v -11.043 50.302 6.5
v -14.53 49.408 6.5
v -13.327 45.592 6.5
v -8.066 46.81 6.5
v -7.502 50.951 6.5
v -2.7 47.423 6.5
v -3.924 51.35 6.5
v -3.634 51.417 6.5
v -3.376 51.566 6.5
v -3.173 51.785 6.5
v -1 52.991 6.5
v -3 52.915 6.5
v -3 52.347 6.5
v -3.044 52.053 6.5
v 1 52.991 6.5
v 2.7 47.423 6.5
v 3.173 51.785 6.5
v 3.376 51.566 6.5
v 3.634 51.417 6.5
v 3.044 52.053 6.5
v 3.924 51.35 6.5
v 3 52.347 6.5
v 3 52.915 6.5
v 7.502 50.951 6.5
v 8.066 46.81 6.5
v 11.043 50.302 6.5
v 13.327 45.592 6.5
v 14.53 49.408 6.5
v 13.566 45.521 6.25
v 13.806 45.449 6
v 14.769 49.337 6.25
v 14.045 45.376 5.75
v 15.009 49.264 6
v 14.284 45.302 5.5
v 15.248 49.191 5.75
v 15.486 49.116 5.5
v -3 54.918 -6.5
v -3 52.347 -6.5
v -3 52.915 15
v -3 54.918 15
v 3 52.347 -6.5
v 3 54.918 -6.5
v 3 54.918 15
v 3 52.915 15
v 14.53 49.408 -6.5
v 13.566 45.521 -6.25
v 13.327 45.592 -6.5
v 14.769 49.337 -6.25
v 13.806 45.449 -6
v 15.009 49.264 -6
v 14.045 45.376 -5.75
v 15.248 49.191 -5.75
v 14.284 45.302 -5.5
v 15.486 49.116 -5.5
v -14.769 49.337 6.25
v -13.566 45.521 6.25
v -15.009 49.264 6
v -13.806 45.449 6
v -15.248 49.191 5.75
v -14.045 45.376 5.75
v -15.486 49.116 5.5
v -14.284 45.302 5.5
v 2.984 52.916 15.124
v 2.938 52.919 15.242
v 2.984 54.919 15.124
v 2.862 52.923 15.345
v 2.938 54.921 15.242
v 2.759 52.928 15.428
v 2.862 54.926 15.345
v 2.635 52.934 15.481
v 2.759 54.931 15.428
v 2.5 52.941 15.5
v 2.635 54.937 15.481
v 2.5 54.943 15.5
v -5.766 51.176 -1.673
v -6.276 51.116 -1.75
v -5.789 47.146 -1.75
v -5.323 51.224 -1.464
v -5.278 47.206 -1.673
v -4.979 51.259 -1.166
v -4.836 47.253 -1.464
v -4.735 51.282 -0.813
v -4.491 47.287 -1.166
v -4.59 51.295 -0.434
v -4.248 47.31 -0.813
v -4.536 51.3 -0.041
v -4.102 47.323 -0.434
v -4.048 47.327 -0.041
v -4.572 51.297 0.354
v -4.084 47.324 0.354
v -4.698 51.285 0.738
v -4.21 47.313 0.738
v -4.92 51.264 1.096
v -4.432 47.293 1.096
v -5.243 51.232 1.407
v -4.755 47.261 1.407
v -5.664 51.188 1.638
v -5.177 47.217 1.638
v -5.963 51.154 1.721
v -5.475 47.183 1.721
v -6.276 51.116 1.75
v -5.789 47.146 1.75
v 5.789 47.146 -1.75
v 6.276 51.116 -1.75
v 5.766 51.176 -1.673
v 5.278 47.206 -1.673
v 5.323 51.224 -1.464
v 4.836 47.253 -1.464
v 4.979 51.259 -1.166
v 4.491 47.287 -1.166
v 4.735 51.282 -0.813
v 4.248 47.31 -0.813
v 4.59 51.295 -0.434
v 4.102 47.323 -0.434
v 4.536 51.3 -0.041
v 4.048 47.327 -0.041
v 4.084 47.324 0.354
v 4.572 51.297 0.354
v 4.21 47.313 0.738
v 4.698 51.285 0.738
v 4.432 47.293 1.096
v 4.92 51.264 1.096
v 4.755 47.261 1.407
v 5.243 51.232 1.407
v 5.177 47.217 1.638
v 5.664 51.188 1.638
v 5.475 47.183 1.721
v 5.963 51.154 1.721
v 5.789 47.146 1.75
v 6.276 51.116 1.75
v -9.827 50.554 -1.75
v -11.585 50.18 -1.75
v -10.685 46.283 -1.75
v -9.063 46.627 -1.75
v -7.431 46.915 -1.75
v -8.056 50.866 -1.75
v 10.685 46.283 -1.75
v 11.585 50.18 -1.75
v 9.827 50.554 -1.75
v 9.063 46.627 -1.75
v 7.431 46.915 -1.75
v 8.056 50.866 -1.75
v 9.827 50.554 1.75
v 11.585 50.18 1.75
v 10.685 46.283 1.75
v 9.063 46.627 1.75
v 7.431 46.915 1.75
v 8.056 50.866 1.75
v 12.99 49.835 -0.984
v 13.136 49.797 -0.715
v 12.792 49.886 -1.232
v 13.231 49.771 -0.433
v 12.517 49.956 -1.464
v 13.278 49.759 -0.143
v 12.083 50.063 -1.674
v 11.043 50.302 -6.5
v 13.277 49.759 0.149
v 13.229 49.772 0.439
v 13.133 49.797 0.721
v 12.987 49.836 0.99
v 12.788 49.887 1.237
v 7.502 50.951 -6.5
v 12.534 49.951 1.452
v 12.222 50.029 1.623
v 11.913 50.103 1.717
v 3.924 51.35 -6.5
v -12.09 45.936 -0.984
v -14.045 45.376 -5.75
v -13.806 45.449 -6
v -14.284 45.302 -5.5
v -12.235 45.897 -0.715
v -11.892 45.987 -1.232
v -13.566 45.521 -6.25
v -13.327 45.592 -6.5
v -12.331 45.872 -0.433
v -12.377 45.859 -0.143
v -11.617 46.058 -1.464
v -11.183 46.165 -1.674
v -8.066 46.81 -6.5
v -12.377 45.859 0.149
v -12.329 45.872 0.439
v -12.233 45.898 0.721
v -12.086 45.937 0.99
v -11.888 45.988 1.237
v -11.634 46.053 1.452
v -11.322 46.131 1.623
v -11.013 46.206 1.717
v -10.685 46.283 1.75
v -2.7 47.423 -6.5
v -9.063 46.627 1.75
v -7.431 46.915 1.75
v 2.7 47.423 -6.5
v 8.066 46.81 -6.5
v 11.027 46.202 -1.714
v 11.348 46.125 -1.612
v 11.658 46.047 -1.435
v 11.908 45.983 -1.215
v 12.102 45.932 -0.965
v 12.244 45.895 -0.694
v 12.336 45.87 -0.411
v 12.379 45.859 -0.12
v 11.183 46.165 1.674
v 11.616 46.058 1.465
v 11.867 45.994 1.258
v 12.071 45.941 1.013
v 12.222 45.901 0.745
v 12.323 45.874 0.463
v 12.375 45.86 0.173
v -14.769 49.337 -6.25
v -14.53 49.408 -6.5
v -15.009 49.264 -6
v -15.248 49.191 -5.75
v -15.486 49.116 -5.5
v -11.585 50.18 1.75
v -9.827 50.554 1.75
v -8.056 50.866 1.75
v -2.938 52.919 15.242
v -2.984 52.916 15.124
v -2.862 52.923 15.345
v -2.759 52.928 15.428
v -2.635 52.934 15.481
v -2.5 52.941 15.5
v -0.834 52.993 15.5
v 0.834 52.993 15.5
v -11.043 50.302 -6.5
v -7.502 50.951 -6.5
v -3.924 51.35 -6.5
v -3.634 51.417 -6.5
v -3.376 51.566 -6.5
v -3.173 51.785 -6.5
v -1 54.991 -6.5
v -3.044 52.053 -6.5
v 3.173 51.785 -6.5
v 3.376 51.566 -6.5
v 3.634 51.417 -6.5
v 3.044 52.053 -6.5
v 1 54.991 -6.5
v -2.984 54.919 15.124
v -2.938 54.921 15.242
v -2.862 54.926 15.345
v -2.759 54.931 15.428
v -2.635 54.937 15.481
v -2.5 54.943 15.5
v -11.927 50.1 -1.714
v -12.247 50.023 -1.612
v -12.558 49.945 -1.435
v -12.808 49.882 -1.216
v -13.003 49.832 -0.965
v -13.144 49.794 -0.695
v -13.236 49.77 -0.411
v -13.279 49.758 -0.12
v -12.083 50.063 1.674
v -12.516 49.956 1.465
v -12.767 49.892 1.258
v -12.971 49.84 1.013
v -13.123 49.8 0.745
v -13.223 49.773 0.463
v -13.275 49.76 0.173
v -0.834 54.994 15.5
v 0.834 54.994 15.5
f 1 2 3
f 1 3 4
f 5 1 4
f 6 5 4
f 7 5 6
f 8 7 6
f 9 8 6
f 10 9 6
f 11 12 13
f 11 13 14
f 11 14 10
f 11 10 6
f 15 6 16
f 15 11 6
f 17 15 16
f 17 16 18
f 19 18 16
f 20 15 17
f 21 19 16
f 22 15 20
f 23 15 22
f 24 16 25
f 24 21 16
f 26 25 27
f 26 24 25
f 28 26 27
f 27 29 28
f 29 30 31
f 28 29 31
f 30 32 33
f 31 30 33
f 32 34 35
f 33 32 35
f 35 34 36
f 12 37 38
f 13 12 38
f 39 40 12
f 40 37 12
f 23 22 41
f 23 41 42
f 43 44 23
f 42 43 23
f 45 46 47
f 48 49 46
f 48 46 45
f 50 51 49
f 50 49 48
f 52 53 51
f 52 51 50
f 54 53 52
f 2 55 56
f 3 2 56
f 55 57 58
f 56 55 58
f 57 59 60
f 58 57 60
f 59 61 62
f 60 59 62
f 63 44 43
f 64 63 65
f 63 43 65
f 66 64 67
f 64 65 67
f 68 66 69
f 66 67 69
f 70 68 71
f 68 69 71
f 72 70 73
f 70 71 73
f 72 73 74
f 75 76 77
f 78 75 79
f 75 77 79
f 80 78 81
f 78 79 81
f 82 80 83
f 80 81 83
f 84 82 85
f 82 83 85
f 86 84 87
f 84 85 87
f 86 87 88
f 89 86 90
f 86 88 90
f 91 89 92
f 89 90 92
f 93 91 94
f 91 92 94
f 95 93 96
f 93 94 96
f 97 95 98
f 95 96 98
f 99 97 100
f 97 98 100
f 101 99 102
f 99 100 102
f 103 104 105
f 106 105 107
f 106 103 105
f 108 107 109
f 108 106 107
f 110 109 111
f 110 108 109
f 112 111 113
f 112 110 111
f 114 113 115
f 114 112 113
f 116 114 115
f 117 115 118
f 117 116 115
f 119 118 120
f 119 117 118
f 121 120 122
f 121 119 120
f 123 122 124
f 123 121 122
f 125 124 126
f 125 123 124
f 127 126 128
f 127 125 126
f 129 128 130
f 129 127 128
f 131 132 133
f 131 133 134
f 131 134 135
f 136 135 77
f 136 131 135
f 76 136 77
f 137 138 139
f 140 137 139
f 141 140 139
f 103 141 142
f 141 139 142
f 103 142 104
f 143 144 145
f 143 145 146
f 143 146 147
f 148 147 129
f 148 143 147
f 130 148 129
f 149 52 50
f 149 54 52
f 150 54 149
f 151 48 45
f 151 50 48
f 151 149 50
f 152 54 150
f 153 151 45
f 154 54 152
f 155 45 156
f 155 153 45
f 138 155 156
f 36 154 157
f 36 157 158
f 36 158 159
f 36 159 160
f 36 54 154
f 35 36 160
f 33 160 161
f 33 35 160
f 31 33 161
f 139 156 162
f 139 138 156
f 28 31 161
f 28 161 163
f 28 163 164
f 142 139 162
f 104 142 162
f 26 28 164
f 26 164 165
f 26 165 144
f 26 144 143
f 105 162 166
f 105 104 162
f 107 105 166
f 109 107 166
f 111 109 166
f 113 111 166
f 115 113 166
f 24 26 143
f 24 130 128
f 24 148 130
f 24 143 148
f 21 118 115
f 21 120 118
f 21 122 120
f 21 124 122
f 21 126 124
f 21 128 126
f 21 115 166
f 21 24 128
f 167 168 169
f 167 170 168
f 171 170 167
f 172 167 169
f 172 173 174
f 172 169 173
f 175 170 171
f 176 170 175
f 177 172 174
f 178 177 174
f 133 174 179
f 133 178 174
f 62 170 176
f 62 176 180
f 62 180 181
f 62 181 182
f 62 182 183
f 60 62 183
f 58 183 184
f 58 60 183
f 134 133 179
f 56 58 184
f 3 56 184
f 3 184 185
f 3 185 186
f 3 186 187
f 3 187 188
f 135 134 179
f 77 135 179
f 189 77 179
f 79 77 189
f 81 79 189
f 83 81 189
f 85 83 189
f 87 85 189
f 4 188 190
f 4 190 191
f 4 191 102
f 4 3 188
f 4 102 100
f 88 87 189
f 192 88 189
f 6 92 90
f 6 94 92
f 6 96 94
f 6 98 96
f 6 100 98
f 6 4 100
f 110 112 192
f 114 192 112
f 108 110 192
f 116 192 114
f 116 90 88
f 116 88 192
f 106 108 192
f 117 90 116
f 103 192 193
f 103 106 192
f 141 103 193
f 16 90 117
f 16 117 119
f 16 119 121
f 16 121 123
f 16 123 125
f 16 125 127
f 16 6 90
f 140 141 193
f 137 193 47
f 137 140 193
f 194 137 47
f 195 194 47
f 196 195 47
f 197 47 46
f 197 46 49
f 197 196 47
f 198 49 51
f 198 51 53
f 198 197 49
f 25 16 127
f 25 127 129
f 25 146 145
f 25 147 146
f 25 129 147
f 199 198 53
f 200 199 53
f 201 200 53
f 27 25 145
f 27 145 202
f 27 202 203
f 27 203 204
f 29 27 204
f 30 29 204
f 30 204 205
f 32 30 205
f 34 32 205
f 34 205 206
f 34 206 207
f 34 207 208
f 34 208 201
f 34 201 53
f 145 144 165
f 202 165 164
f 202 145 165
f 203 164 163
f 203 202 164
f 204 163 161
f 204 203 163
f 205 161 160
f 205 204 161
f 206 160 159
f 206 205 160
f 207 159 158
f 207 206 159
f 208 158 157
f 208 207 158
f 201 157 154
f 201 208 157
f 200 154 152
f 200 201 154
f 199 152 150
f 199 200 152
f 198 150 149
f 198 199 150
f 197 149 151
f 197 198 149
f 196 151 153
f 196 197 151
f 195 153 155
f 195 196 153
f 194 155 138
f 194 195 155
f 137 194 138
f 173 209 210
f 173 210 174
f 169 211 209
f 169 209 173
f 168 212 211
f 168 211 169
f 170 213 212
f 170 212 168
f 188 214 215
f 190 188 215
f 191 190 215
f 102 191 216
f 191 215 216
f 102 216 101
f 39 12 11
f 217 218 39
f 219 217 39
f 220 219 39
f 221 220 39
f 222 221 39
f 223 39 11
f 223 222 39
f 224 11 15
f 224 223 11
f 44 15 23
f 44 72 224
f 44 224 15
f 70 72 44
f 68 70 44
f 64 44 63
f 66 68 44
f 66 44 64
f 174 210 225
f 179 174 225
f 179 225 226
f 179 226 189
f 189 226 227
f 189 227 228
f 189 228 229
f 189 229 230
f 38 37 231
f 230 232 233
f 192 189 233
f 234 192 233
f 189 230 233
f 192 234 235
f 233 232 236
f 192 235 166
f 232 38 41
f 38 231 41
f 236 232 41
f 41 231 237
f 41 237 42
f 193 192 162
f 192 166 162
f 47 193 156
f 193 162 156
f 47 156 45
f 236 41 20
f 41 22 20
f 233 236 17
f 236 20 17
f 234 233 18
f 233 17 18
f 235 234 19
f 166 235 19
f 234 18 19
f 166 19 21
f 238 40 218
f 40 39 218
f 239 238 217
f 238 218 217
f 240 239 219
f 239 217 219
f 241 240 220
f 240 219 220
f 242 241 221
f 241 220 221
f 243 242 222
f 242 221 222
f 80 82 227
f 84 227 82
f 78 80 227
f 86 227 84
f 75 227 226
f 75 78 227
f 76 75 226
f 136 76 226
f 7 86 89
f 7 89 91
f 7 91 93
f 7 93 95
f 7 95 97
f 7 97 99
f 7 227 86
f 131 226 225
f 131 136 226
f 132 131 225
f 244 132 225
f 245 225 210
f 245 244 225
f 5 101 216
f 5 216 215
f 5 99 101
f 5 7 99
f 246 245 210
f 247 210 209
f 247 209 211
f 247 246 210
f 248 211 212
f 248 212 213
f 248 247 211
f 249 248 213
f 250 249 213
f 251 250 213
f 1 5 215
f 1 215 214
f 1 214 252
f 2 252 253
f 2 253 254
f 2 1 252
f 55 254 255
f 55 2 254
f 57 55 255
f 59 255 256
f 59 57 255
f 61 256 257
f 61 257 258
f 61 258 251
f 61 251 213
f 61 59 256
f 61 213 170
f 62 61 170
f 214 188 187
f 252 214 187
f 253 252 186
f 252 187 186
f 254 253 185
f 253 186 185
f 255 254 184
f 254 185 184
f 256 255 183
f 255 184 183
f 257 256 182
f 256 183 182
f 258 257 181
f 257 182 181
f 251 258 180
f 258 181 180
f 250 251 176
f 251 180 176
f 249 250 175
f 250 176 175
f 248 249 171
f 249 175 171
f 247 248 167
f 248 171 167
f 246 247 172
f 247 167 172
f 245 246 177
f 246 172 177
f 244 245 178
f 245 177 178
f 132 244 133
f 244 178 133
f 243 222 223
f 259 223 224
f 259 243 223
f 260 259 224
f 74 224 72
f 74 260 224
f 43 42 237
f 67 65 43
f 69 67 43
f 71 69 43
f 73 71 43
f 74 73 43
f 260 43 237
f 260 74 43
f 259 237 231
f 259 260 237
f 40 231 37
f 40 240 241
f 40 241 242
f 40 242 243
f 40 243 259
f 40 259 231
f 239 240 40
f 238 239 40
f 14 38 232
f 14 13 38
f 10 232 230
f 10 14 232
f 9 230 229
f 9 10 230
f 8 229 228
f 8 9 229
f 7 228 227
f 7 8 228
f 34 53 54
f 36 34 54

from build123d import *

# Parameters (mm, degrees)
EXTRUDE_1_DEPTH          = 6.5
EXTRUDE_START            = 9
EXTRUDE_2_DEPTH          = 9
PATTERN_CIRCULAR_1_COUNT = 2
PATTERN_CIRCULAR_1_ANGLE = 6
CUT_EXTRUDE_2_DEPTH      = 1.75
FILLET_1_R               = 1
CHAMFER_1_SIZE           = 1
FILLET_2_R               = 0.5


with BuildPart() as part:
    # Эскиз1 → Бобышка-Вытянуть1 (new, symmetric)
    with BuildSketch(Plane.XY):
        with BuildLine():
            Line((14.283525476, 45.301555161), (15.486348674, 49.116422964))
            ThreePointArc((15.486348674, 49.116422964), (9.314199823, 50.65072242), (3, 51.412547107))
            Line((3, 51.412547107), (3, 54.918120871))
            ThreePointArc((3, 54.918120871), (0, 55), (-3, 54.918120871))
            Line((-3, 54.918120871), (-3, 51.412547107))
            ThreePointArc((-3, 51.412547107), (-9.314199823, 50.65072242), (-15.486348674, 49.116422964))
            Line((-15.486348674, 49.116422964), (-14.283525476, 45.301555161))
            ThreePointArc((-14.283525476, 45.301555161), (0, 47.5), (14.283525476, 45.301555161))
        make_face()
    extrude(amount=EXTRUDE_1_DEPTH, both=True)

    # Эскиз2 → Бобышка-Вытянуть2 (add)
    with BuildSketch(Plane.XY.offset(6.5).offset(EXTRUDE_START)):
        with BuildLine():
            Line((3, 52.915026221), (3, 54.918120871))
            ThreePointArc((3, 54.918120871), (0, 55), (-3, 54.918120871))
            Line((-3, 54.918120871), (-3, 52.915026221))
            ThreePointArc((-3, 52.915026221), (0, 53), (3, 52.915026221))
        make_face()
    extrude(amount=-EXTRUDE_2_DEPTH)

    # Эскиз4 → Вырез-Повернуть1 (revolve, cut)
    with BuildSketch(Plane.XY):
        Polygon((15.202210874, 58.068539542), (10.703189787, 38.581138246), (8.998042174, 38.974802591), (13.497063261, 58.462203887), align=None)
    cut_revolve_1 = revolve(axis=Axis((0, 0, 0), (0.22495105434386545, 0.9743700647852351, 0)), mode=Mode.SUBTRACT)

    # Круговой массив1: Вырез-Повернуть1 ×2 about axis
    pattern_circular_1_axis = Axis((0, 0, 6.5), (0, 0, 1))
    for i in range(1, PATTERN_CIRCULAR_1_COUNT):
        add(cut_revolve_1.rotate(pattern_circular_1_axis, i * PATTERN_CIRCULAR_1_ANGLE / (PATTERN_CIRCULAR_1_COUNT - 1)), mode=Mode.SUBTRACT)

    # Эскиз6 → Вырез-Вытянуть2 (cut, symmetric)
    with BuildSketch(Plane.XY):
        with BuildLine():
            Line((5.788793812, 47.145942203), (6.276271185, 51.11612681))
            ThreePointArc((6.276271185, 51.11612681), (8.94288115, 50.71759928), (11.584979299, 50.180058336))
            Line((11.584979299, 50.180058336), (10.685175081, 46.282578077))
            ThreePointArc((10.685175081, 46.282578077), (8.248288439, 46.778368268), (5.788793812, 47.145942203))
        make_face()
    cut_extrude_2 = extrude(amount=CUT_EXTRUDE_2_DEPTH, both=True, mode=Mode.SUBTRACT)

    # Зеркальное отражение1: Вырез-Повернуть1, Вырез-Вытянуть2 across plane
    add(cut_revolve_1.mirror(Plane(origin=(0, 0, 0), x_dir=(0, 0, 1), z_dir=(1, 0, 0))), mode=Mode.SUBTRACT)
    add(cut_extrude_2.mirror(Plane(origin=(0, 0, 0), x_dir=(0, 0, 1), z_dir=(1, 0, 0))), mode=Mode.SUBTRACT)

    # Зеркальное отражение1 copy 1 sketch → Зеркальное отражение1 copy 1 (revolve, cut)
    with BuildSketch(Plane(origin=(0, 0, 0), x_dir=(-0.9945218953682733, 0.10452846326765369, 0), z_dir=(0, 0, 1))):
        Polygon((15.202210874, -58.068539542), (10.703189787, -38.581138246), (8.998042174, -38.974802591), (13.497063261, -58.462203887), align=None)
    revolve(axis=Axis((0, 0, 0), (0.12186934340514771, -0.992546151641322, 0)), mode=Mode.SUBTRACT)

    # Скругление1
    fillet_1_edges = [part.edges().sort_by_distance(p)[0] for p in [
        (-3, 51.412547107, 0),
        (3, 51.412547107, 0),
    ]]
    fillet(fillet_1_edges, radius=FILLET_1_R)

    # Фаска1
    chamfer_1_edges = [part.edges().sort_by_distance(p)[0] for p in [
        (14.884937075, 47.208989062, -6.5),
        (-14.884937075, 47.208989062, 6.5),
        (-14.884937075, 47.208989062, -6.5),
        (14.884937075, 47.208989062, 6.5),
    ]]
    chamfer(chamfer_1_edges, length=CHAMFER_1_SIZE)

    # Скругление2
    fillet_2_edges = [part.edges().sort_by_distance(p)[0] for p in [
        (-3, 53.916573546, 15.5),
        (3, 53.916573546, 15.5),
    ]]
    fillet(fillet_2_edges, radius=FILLET_2_R)


solid = part.part
